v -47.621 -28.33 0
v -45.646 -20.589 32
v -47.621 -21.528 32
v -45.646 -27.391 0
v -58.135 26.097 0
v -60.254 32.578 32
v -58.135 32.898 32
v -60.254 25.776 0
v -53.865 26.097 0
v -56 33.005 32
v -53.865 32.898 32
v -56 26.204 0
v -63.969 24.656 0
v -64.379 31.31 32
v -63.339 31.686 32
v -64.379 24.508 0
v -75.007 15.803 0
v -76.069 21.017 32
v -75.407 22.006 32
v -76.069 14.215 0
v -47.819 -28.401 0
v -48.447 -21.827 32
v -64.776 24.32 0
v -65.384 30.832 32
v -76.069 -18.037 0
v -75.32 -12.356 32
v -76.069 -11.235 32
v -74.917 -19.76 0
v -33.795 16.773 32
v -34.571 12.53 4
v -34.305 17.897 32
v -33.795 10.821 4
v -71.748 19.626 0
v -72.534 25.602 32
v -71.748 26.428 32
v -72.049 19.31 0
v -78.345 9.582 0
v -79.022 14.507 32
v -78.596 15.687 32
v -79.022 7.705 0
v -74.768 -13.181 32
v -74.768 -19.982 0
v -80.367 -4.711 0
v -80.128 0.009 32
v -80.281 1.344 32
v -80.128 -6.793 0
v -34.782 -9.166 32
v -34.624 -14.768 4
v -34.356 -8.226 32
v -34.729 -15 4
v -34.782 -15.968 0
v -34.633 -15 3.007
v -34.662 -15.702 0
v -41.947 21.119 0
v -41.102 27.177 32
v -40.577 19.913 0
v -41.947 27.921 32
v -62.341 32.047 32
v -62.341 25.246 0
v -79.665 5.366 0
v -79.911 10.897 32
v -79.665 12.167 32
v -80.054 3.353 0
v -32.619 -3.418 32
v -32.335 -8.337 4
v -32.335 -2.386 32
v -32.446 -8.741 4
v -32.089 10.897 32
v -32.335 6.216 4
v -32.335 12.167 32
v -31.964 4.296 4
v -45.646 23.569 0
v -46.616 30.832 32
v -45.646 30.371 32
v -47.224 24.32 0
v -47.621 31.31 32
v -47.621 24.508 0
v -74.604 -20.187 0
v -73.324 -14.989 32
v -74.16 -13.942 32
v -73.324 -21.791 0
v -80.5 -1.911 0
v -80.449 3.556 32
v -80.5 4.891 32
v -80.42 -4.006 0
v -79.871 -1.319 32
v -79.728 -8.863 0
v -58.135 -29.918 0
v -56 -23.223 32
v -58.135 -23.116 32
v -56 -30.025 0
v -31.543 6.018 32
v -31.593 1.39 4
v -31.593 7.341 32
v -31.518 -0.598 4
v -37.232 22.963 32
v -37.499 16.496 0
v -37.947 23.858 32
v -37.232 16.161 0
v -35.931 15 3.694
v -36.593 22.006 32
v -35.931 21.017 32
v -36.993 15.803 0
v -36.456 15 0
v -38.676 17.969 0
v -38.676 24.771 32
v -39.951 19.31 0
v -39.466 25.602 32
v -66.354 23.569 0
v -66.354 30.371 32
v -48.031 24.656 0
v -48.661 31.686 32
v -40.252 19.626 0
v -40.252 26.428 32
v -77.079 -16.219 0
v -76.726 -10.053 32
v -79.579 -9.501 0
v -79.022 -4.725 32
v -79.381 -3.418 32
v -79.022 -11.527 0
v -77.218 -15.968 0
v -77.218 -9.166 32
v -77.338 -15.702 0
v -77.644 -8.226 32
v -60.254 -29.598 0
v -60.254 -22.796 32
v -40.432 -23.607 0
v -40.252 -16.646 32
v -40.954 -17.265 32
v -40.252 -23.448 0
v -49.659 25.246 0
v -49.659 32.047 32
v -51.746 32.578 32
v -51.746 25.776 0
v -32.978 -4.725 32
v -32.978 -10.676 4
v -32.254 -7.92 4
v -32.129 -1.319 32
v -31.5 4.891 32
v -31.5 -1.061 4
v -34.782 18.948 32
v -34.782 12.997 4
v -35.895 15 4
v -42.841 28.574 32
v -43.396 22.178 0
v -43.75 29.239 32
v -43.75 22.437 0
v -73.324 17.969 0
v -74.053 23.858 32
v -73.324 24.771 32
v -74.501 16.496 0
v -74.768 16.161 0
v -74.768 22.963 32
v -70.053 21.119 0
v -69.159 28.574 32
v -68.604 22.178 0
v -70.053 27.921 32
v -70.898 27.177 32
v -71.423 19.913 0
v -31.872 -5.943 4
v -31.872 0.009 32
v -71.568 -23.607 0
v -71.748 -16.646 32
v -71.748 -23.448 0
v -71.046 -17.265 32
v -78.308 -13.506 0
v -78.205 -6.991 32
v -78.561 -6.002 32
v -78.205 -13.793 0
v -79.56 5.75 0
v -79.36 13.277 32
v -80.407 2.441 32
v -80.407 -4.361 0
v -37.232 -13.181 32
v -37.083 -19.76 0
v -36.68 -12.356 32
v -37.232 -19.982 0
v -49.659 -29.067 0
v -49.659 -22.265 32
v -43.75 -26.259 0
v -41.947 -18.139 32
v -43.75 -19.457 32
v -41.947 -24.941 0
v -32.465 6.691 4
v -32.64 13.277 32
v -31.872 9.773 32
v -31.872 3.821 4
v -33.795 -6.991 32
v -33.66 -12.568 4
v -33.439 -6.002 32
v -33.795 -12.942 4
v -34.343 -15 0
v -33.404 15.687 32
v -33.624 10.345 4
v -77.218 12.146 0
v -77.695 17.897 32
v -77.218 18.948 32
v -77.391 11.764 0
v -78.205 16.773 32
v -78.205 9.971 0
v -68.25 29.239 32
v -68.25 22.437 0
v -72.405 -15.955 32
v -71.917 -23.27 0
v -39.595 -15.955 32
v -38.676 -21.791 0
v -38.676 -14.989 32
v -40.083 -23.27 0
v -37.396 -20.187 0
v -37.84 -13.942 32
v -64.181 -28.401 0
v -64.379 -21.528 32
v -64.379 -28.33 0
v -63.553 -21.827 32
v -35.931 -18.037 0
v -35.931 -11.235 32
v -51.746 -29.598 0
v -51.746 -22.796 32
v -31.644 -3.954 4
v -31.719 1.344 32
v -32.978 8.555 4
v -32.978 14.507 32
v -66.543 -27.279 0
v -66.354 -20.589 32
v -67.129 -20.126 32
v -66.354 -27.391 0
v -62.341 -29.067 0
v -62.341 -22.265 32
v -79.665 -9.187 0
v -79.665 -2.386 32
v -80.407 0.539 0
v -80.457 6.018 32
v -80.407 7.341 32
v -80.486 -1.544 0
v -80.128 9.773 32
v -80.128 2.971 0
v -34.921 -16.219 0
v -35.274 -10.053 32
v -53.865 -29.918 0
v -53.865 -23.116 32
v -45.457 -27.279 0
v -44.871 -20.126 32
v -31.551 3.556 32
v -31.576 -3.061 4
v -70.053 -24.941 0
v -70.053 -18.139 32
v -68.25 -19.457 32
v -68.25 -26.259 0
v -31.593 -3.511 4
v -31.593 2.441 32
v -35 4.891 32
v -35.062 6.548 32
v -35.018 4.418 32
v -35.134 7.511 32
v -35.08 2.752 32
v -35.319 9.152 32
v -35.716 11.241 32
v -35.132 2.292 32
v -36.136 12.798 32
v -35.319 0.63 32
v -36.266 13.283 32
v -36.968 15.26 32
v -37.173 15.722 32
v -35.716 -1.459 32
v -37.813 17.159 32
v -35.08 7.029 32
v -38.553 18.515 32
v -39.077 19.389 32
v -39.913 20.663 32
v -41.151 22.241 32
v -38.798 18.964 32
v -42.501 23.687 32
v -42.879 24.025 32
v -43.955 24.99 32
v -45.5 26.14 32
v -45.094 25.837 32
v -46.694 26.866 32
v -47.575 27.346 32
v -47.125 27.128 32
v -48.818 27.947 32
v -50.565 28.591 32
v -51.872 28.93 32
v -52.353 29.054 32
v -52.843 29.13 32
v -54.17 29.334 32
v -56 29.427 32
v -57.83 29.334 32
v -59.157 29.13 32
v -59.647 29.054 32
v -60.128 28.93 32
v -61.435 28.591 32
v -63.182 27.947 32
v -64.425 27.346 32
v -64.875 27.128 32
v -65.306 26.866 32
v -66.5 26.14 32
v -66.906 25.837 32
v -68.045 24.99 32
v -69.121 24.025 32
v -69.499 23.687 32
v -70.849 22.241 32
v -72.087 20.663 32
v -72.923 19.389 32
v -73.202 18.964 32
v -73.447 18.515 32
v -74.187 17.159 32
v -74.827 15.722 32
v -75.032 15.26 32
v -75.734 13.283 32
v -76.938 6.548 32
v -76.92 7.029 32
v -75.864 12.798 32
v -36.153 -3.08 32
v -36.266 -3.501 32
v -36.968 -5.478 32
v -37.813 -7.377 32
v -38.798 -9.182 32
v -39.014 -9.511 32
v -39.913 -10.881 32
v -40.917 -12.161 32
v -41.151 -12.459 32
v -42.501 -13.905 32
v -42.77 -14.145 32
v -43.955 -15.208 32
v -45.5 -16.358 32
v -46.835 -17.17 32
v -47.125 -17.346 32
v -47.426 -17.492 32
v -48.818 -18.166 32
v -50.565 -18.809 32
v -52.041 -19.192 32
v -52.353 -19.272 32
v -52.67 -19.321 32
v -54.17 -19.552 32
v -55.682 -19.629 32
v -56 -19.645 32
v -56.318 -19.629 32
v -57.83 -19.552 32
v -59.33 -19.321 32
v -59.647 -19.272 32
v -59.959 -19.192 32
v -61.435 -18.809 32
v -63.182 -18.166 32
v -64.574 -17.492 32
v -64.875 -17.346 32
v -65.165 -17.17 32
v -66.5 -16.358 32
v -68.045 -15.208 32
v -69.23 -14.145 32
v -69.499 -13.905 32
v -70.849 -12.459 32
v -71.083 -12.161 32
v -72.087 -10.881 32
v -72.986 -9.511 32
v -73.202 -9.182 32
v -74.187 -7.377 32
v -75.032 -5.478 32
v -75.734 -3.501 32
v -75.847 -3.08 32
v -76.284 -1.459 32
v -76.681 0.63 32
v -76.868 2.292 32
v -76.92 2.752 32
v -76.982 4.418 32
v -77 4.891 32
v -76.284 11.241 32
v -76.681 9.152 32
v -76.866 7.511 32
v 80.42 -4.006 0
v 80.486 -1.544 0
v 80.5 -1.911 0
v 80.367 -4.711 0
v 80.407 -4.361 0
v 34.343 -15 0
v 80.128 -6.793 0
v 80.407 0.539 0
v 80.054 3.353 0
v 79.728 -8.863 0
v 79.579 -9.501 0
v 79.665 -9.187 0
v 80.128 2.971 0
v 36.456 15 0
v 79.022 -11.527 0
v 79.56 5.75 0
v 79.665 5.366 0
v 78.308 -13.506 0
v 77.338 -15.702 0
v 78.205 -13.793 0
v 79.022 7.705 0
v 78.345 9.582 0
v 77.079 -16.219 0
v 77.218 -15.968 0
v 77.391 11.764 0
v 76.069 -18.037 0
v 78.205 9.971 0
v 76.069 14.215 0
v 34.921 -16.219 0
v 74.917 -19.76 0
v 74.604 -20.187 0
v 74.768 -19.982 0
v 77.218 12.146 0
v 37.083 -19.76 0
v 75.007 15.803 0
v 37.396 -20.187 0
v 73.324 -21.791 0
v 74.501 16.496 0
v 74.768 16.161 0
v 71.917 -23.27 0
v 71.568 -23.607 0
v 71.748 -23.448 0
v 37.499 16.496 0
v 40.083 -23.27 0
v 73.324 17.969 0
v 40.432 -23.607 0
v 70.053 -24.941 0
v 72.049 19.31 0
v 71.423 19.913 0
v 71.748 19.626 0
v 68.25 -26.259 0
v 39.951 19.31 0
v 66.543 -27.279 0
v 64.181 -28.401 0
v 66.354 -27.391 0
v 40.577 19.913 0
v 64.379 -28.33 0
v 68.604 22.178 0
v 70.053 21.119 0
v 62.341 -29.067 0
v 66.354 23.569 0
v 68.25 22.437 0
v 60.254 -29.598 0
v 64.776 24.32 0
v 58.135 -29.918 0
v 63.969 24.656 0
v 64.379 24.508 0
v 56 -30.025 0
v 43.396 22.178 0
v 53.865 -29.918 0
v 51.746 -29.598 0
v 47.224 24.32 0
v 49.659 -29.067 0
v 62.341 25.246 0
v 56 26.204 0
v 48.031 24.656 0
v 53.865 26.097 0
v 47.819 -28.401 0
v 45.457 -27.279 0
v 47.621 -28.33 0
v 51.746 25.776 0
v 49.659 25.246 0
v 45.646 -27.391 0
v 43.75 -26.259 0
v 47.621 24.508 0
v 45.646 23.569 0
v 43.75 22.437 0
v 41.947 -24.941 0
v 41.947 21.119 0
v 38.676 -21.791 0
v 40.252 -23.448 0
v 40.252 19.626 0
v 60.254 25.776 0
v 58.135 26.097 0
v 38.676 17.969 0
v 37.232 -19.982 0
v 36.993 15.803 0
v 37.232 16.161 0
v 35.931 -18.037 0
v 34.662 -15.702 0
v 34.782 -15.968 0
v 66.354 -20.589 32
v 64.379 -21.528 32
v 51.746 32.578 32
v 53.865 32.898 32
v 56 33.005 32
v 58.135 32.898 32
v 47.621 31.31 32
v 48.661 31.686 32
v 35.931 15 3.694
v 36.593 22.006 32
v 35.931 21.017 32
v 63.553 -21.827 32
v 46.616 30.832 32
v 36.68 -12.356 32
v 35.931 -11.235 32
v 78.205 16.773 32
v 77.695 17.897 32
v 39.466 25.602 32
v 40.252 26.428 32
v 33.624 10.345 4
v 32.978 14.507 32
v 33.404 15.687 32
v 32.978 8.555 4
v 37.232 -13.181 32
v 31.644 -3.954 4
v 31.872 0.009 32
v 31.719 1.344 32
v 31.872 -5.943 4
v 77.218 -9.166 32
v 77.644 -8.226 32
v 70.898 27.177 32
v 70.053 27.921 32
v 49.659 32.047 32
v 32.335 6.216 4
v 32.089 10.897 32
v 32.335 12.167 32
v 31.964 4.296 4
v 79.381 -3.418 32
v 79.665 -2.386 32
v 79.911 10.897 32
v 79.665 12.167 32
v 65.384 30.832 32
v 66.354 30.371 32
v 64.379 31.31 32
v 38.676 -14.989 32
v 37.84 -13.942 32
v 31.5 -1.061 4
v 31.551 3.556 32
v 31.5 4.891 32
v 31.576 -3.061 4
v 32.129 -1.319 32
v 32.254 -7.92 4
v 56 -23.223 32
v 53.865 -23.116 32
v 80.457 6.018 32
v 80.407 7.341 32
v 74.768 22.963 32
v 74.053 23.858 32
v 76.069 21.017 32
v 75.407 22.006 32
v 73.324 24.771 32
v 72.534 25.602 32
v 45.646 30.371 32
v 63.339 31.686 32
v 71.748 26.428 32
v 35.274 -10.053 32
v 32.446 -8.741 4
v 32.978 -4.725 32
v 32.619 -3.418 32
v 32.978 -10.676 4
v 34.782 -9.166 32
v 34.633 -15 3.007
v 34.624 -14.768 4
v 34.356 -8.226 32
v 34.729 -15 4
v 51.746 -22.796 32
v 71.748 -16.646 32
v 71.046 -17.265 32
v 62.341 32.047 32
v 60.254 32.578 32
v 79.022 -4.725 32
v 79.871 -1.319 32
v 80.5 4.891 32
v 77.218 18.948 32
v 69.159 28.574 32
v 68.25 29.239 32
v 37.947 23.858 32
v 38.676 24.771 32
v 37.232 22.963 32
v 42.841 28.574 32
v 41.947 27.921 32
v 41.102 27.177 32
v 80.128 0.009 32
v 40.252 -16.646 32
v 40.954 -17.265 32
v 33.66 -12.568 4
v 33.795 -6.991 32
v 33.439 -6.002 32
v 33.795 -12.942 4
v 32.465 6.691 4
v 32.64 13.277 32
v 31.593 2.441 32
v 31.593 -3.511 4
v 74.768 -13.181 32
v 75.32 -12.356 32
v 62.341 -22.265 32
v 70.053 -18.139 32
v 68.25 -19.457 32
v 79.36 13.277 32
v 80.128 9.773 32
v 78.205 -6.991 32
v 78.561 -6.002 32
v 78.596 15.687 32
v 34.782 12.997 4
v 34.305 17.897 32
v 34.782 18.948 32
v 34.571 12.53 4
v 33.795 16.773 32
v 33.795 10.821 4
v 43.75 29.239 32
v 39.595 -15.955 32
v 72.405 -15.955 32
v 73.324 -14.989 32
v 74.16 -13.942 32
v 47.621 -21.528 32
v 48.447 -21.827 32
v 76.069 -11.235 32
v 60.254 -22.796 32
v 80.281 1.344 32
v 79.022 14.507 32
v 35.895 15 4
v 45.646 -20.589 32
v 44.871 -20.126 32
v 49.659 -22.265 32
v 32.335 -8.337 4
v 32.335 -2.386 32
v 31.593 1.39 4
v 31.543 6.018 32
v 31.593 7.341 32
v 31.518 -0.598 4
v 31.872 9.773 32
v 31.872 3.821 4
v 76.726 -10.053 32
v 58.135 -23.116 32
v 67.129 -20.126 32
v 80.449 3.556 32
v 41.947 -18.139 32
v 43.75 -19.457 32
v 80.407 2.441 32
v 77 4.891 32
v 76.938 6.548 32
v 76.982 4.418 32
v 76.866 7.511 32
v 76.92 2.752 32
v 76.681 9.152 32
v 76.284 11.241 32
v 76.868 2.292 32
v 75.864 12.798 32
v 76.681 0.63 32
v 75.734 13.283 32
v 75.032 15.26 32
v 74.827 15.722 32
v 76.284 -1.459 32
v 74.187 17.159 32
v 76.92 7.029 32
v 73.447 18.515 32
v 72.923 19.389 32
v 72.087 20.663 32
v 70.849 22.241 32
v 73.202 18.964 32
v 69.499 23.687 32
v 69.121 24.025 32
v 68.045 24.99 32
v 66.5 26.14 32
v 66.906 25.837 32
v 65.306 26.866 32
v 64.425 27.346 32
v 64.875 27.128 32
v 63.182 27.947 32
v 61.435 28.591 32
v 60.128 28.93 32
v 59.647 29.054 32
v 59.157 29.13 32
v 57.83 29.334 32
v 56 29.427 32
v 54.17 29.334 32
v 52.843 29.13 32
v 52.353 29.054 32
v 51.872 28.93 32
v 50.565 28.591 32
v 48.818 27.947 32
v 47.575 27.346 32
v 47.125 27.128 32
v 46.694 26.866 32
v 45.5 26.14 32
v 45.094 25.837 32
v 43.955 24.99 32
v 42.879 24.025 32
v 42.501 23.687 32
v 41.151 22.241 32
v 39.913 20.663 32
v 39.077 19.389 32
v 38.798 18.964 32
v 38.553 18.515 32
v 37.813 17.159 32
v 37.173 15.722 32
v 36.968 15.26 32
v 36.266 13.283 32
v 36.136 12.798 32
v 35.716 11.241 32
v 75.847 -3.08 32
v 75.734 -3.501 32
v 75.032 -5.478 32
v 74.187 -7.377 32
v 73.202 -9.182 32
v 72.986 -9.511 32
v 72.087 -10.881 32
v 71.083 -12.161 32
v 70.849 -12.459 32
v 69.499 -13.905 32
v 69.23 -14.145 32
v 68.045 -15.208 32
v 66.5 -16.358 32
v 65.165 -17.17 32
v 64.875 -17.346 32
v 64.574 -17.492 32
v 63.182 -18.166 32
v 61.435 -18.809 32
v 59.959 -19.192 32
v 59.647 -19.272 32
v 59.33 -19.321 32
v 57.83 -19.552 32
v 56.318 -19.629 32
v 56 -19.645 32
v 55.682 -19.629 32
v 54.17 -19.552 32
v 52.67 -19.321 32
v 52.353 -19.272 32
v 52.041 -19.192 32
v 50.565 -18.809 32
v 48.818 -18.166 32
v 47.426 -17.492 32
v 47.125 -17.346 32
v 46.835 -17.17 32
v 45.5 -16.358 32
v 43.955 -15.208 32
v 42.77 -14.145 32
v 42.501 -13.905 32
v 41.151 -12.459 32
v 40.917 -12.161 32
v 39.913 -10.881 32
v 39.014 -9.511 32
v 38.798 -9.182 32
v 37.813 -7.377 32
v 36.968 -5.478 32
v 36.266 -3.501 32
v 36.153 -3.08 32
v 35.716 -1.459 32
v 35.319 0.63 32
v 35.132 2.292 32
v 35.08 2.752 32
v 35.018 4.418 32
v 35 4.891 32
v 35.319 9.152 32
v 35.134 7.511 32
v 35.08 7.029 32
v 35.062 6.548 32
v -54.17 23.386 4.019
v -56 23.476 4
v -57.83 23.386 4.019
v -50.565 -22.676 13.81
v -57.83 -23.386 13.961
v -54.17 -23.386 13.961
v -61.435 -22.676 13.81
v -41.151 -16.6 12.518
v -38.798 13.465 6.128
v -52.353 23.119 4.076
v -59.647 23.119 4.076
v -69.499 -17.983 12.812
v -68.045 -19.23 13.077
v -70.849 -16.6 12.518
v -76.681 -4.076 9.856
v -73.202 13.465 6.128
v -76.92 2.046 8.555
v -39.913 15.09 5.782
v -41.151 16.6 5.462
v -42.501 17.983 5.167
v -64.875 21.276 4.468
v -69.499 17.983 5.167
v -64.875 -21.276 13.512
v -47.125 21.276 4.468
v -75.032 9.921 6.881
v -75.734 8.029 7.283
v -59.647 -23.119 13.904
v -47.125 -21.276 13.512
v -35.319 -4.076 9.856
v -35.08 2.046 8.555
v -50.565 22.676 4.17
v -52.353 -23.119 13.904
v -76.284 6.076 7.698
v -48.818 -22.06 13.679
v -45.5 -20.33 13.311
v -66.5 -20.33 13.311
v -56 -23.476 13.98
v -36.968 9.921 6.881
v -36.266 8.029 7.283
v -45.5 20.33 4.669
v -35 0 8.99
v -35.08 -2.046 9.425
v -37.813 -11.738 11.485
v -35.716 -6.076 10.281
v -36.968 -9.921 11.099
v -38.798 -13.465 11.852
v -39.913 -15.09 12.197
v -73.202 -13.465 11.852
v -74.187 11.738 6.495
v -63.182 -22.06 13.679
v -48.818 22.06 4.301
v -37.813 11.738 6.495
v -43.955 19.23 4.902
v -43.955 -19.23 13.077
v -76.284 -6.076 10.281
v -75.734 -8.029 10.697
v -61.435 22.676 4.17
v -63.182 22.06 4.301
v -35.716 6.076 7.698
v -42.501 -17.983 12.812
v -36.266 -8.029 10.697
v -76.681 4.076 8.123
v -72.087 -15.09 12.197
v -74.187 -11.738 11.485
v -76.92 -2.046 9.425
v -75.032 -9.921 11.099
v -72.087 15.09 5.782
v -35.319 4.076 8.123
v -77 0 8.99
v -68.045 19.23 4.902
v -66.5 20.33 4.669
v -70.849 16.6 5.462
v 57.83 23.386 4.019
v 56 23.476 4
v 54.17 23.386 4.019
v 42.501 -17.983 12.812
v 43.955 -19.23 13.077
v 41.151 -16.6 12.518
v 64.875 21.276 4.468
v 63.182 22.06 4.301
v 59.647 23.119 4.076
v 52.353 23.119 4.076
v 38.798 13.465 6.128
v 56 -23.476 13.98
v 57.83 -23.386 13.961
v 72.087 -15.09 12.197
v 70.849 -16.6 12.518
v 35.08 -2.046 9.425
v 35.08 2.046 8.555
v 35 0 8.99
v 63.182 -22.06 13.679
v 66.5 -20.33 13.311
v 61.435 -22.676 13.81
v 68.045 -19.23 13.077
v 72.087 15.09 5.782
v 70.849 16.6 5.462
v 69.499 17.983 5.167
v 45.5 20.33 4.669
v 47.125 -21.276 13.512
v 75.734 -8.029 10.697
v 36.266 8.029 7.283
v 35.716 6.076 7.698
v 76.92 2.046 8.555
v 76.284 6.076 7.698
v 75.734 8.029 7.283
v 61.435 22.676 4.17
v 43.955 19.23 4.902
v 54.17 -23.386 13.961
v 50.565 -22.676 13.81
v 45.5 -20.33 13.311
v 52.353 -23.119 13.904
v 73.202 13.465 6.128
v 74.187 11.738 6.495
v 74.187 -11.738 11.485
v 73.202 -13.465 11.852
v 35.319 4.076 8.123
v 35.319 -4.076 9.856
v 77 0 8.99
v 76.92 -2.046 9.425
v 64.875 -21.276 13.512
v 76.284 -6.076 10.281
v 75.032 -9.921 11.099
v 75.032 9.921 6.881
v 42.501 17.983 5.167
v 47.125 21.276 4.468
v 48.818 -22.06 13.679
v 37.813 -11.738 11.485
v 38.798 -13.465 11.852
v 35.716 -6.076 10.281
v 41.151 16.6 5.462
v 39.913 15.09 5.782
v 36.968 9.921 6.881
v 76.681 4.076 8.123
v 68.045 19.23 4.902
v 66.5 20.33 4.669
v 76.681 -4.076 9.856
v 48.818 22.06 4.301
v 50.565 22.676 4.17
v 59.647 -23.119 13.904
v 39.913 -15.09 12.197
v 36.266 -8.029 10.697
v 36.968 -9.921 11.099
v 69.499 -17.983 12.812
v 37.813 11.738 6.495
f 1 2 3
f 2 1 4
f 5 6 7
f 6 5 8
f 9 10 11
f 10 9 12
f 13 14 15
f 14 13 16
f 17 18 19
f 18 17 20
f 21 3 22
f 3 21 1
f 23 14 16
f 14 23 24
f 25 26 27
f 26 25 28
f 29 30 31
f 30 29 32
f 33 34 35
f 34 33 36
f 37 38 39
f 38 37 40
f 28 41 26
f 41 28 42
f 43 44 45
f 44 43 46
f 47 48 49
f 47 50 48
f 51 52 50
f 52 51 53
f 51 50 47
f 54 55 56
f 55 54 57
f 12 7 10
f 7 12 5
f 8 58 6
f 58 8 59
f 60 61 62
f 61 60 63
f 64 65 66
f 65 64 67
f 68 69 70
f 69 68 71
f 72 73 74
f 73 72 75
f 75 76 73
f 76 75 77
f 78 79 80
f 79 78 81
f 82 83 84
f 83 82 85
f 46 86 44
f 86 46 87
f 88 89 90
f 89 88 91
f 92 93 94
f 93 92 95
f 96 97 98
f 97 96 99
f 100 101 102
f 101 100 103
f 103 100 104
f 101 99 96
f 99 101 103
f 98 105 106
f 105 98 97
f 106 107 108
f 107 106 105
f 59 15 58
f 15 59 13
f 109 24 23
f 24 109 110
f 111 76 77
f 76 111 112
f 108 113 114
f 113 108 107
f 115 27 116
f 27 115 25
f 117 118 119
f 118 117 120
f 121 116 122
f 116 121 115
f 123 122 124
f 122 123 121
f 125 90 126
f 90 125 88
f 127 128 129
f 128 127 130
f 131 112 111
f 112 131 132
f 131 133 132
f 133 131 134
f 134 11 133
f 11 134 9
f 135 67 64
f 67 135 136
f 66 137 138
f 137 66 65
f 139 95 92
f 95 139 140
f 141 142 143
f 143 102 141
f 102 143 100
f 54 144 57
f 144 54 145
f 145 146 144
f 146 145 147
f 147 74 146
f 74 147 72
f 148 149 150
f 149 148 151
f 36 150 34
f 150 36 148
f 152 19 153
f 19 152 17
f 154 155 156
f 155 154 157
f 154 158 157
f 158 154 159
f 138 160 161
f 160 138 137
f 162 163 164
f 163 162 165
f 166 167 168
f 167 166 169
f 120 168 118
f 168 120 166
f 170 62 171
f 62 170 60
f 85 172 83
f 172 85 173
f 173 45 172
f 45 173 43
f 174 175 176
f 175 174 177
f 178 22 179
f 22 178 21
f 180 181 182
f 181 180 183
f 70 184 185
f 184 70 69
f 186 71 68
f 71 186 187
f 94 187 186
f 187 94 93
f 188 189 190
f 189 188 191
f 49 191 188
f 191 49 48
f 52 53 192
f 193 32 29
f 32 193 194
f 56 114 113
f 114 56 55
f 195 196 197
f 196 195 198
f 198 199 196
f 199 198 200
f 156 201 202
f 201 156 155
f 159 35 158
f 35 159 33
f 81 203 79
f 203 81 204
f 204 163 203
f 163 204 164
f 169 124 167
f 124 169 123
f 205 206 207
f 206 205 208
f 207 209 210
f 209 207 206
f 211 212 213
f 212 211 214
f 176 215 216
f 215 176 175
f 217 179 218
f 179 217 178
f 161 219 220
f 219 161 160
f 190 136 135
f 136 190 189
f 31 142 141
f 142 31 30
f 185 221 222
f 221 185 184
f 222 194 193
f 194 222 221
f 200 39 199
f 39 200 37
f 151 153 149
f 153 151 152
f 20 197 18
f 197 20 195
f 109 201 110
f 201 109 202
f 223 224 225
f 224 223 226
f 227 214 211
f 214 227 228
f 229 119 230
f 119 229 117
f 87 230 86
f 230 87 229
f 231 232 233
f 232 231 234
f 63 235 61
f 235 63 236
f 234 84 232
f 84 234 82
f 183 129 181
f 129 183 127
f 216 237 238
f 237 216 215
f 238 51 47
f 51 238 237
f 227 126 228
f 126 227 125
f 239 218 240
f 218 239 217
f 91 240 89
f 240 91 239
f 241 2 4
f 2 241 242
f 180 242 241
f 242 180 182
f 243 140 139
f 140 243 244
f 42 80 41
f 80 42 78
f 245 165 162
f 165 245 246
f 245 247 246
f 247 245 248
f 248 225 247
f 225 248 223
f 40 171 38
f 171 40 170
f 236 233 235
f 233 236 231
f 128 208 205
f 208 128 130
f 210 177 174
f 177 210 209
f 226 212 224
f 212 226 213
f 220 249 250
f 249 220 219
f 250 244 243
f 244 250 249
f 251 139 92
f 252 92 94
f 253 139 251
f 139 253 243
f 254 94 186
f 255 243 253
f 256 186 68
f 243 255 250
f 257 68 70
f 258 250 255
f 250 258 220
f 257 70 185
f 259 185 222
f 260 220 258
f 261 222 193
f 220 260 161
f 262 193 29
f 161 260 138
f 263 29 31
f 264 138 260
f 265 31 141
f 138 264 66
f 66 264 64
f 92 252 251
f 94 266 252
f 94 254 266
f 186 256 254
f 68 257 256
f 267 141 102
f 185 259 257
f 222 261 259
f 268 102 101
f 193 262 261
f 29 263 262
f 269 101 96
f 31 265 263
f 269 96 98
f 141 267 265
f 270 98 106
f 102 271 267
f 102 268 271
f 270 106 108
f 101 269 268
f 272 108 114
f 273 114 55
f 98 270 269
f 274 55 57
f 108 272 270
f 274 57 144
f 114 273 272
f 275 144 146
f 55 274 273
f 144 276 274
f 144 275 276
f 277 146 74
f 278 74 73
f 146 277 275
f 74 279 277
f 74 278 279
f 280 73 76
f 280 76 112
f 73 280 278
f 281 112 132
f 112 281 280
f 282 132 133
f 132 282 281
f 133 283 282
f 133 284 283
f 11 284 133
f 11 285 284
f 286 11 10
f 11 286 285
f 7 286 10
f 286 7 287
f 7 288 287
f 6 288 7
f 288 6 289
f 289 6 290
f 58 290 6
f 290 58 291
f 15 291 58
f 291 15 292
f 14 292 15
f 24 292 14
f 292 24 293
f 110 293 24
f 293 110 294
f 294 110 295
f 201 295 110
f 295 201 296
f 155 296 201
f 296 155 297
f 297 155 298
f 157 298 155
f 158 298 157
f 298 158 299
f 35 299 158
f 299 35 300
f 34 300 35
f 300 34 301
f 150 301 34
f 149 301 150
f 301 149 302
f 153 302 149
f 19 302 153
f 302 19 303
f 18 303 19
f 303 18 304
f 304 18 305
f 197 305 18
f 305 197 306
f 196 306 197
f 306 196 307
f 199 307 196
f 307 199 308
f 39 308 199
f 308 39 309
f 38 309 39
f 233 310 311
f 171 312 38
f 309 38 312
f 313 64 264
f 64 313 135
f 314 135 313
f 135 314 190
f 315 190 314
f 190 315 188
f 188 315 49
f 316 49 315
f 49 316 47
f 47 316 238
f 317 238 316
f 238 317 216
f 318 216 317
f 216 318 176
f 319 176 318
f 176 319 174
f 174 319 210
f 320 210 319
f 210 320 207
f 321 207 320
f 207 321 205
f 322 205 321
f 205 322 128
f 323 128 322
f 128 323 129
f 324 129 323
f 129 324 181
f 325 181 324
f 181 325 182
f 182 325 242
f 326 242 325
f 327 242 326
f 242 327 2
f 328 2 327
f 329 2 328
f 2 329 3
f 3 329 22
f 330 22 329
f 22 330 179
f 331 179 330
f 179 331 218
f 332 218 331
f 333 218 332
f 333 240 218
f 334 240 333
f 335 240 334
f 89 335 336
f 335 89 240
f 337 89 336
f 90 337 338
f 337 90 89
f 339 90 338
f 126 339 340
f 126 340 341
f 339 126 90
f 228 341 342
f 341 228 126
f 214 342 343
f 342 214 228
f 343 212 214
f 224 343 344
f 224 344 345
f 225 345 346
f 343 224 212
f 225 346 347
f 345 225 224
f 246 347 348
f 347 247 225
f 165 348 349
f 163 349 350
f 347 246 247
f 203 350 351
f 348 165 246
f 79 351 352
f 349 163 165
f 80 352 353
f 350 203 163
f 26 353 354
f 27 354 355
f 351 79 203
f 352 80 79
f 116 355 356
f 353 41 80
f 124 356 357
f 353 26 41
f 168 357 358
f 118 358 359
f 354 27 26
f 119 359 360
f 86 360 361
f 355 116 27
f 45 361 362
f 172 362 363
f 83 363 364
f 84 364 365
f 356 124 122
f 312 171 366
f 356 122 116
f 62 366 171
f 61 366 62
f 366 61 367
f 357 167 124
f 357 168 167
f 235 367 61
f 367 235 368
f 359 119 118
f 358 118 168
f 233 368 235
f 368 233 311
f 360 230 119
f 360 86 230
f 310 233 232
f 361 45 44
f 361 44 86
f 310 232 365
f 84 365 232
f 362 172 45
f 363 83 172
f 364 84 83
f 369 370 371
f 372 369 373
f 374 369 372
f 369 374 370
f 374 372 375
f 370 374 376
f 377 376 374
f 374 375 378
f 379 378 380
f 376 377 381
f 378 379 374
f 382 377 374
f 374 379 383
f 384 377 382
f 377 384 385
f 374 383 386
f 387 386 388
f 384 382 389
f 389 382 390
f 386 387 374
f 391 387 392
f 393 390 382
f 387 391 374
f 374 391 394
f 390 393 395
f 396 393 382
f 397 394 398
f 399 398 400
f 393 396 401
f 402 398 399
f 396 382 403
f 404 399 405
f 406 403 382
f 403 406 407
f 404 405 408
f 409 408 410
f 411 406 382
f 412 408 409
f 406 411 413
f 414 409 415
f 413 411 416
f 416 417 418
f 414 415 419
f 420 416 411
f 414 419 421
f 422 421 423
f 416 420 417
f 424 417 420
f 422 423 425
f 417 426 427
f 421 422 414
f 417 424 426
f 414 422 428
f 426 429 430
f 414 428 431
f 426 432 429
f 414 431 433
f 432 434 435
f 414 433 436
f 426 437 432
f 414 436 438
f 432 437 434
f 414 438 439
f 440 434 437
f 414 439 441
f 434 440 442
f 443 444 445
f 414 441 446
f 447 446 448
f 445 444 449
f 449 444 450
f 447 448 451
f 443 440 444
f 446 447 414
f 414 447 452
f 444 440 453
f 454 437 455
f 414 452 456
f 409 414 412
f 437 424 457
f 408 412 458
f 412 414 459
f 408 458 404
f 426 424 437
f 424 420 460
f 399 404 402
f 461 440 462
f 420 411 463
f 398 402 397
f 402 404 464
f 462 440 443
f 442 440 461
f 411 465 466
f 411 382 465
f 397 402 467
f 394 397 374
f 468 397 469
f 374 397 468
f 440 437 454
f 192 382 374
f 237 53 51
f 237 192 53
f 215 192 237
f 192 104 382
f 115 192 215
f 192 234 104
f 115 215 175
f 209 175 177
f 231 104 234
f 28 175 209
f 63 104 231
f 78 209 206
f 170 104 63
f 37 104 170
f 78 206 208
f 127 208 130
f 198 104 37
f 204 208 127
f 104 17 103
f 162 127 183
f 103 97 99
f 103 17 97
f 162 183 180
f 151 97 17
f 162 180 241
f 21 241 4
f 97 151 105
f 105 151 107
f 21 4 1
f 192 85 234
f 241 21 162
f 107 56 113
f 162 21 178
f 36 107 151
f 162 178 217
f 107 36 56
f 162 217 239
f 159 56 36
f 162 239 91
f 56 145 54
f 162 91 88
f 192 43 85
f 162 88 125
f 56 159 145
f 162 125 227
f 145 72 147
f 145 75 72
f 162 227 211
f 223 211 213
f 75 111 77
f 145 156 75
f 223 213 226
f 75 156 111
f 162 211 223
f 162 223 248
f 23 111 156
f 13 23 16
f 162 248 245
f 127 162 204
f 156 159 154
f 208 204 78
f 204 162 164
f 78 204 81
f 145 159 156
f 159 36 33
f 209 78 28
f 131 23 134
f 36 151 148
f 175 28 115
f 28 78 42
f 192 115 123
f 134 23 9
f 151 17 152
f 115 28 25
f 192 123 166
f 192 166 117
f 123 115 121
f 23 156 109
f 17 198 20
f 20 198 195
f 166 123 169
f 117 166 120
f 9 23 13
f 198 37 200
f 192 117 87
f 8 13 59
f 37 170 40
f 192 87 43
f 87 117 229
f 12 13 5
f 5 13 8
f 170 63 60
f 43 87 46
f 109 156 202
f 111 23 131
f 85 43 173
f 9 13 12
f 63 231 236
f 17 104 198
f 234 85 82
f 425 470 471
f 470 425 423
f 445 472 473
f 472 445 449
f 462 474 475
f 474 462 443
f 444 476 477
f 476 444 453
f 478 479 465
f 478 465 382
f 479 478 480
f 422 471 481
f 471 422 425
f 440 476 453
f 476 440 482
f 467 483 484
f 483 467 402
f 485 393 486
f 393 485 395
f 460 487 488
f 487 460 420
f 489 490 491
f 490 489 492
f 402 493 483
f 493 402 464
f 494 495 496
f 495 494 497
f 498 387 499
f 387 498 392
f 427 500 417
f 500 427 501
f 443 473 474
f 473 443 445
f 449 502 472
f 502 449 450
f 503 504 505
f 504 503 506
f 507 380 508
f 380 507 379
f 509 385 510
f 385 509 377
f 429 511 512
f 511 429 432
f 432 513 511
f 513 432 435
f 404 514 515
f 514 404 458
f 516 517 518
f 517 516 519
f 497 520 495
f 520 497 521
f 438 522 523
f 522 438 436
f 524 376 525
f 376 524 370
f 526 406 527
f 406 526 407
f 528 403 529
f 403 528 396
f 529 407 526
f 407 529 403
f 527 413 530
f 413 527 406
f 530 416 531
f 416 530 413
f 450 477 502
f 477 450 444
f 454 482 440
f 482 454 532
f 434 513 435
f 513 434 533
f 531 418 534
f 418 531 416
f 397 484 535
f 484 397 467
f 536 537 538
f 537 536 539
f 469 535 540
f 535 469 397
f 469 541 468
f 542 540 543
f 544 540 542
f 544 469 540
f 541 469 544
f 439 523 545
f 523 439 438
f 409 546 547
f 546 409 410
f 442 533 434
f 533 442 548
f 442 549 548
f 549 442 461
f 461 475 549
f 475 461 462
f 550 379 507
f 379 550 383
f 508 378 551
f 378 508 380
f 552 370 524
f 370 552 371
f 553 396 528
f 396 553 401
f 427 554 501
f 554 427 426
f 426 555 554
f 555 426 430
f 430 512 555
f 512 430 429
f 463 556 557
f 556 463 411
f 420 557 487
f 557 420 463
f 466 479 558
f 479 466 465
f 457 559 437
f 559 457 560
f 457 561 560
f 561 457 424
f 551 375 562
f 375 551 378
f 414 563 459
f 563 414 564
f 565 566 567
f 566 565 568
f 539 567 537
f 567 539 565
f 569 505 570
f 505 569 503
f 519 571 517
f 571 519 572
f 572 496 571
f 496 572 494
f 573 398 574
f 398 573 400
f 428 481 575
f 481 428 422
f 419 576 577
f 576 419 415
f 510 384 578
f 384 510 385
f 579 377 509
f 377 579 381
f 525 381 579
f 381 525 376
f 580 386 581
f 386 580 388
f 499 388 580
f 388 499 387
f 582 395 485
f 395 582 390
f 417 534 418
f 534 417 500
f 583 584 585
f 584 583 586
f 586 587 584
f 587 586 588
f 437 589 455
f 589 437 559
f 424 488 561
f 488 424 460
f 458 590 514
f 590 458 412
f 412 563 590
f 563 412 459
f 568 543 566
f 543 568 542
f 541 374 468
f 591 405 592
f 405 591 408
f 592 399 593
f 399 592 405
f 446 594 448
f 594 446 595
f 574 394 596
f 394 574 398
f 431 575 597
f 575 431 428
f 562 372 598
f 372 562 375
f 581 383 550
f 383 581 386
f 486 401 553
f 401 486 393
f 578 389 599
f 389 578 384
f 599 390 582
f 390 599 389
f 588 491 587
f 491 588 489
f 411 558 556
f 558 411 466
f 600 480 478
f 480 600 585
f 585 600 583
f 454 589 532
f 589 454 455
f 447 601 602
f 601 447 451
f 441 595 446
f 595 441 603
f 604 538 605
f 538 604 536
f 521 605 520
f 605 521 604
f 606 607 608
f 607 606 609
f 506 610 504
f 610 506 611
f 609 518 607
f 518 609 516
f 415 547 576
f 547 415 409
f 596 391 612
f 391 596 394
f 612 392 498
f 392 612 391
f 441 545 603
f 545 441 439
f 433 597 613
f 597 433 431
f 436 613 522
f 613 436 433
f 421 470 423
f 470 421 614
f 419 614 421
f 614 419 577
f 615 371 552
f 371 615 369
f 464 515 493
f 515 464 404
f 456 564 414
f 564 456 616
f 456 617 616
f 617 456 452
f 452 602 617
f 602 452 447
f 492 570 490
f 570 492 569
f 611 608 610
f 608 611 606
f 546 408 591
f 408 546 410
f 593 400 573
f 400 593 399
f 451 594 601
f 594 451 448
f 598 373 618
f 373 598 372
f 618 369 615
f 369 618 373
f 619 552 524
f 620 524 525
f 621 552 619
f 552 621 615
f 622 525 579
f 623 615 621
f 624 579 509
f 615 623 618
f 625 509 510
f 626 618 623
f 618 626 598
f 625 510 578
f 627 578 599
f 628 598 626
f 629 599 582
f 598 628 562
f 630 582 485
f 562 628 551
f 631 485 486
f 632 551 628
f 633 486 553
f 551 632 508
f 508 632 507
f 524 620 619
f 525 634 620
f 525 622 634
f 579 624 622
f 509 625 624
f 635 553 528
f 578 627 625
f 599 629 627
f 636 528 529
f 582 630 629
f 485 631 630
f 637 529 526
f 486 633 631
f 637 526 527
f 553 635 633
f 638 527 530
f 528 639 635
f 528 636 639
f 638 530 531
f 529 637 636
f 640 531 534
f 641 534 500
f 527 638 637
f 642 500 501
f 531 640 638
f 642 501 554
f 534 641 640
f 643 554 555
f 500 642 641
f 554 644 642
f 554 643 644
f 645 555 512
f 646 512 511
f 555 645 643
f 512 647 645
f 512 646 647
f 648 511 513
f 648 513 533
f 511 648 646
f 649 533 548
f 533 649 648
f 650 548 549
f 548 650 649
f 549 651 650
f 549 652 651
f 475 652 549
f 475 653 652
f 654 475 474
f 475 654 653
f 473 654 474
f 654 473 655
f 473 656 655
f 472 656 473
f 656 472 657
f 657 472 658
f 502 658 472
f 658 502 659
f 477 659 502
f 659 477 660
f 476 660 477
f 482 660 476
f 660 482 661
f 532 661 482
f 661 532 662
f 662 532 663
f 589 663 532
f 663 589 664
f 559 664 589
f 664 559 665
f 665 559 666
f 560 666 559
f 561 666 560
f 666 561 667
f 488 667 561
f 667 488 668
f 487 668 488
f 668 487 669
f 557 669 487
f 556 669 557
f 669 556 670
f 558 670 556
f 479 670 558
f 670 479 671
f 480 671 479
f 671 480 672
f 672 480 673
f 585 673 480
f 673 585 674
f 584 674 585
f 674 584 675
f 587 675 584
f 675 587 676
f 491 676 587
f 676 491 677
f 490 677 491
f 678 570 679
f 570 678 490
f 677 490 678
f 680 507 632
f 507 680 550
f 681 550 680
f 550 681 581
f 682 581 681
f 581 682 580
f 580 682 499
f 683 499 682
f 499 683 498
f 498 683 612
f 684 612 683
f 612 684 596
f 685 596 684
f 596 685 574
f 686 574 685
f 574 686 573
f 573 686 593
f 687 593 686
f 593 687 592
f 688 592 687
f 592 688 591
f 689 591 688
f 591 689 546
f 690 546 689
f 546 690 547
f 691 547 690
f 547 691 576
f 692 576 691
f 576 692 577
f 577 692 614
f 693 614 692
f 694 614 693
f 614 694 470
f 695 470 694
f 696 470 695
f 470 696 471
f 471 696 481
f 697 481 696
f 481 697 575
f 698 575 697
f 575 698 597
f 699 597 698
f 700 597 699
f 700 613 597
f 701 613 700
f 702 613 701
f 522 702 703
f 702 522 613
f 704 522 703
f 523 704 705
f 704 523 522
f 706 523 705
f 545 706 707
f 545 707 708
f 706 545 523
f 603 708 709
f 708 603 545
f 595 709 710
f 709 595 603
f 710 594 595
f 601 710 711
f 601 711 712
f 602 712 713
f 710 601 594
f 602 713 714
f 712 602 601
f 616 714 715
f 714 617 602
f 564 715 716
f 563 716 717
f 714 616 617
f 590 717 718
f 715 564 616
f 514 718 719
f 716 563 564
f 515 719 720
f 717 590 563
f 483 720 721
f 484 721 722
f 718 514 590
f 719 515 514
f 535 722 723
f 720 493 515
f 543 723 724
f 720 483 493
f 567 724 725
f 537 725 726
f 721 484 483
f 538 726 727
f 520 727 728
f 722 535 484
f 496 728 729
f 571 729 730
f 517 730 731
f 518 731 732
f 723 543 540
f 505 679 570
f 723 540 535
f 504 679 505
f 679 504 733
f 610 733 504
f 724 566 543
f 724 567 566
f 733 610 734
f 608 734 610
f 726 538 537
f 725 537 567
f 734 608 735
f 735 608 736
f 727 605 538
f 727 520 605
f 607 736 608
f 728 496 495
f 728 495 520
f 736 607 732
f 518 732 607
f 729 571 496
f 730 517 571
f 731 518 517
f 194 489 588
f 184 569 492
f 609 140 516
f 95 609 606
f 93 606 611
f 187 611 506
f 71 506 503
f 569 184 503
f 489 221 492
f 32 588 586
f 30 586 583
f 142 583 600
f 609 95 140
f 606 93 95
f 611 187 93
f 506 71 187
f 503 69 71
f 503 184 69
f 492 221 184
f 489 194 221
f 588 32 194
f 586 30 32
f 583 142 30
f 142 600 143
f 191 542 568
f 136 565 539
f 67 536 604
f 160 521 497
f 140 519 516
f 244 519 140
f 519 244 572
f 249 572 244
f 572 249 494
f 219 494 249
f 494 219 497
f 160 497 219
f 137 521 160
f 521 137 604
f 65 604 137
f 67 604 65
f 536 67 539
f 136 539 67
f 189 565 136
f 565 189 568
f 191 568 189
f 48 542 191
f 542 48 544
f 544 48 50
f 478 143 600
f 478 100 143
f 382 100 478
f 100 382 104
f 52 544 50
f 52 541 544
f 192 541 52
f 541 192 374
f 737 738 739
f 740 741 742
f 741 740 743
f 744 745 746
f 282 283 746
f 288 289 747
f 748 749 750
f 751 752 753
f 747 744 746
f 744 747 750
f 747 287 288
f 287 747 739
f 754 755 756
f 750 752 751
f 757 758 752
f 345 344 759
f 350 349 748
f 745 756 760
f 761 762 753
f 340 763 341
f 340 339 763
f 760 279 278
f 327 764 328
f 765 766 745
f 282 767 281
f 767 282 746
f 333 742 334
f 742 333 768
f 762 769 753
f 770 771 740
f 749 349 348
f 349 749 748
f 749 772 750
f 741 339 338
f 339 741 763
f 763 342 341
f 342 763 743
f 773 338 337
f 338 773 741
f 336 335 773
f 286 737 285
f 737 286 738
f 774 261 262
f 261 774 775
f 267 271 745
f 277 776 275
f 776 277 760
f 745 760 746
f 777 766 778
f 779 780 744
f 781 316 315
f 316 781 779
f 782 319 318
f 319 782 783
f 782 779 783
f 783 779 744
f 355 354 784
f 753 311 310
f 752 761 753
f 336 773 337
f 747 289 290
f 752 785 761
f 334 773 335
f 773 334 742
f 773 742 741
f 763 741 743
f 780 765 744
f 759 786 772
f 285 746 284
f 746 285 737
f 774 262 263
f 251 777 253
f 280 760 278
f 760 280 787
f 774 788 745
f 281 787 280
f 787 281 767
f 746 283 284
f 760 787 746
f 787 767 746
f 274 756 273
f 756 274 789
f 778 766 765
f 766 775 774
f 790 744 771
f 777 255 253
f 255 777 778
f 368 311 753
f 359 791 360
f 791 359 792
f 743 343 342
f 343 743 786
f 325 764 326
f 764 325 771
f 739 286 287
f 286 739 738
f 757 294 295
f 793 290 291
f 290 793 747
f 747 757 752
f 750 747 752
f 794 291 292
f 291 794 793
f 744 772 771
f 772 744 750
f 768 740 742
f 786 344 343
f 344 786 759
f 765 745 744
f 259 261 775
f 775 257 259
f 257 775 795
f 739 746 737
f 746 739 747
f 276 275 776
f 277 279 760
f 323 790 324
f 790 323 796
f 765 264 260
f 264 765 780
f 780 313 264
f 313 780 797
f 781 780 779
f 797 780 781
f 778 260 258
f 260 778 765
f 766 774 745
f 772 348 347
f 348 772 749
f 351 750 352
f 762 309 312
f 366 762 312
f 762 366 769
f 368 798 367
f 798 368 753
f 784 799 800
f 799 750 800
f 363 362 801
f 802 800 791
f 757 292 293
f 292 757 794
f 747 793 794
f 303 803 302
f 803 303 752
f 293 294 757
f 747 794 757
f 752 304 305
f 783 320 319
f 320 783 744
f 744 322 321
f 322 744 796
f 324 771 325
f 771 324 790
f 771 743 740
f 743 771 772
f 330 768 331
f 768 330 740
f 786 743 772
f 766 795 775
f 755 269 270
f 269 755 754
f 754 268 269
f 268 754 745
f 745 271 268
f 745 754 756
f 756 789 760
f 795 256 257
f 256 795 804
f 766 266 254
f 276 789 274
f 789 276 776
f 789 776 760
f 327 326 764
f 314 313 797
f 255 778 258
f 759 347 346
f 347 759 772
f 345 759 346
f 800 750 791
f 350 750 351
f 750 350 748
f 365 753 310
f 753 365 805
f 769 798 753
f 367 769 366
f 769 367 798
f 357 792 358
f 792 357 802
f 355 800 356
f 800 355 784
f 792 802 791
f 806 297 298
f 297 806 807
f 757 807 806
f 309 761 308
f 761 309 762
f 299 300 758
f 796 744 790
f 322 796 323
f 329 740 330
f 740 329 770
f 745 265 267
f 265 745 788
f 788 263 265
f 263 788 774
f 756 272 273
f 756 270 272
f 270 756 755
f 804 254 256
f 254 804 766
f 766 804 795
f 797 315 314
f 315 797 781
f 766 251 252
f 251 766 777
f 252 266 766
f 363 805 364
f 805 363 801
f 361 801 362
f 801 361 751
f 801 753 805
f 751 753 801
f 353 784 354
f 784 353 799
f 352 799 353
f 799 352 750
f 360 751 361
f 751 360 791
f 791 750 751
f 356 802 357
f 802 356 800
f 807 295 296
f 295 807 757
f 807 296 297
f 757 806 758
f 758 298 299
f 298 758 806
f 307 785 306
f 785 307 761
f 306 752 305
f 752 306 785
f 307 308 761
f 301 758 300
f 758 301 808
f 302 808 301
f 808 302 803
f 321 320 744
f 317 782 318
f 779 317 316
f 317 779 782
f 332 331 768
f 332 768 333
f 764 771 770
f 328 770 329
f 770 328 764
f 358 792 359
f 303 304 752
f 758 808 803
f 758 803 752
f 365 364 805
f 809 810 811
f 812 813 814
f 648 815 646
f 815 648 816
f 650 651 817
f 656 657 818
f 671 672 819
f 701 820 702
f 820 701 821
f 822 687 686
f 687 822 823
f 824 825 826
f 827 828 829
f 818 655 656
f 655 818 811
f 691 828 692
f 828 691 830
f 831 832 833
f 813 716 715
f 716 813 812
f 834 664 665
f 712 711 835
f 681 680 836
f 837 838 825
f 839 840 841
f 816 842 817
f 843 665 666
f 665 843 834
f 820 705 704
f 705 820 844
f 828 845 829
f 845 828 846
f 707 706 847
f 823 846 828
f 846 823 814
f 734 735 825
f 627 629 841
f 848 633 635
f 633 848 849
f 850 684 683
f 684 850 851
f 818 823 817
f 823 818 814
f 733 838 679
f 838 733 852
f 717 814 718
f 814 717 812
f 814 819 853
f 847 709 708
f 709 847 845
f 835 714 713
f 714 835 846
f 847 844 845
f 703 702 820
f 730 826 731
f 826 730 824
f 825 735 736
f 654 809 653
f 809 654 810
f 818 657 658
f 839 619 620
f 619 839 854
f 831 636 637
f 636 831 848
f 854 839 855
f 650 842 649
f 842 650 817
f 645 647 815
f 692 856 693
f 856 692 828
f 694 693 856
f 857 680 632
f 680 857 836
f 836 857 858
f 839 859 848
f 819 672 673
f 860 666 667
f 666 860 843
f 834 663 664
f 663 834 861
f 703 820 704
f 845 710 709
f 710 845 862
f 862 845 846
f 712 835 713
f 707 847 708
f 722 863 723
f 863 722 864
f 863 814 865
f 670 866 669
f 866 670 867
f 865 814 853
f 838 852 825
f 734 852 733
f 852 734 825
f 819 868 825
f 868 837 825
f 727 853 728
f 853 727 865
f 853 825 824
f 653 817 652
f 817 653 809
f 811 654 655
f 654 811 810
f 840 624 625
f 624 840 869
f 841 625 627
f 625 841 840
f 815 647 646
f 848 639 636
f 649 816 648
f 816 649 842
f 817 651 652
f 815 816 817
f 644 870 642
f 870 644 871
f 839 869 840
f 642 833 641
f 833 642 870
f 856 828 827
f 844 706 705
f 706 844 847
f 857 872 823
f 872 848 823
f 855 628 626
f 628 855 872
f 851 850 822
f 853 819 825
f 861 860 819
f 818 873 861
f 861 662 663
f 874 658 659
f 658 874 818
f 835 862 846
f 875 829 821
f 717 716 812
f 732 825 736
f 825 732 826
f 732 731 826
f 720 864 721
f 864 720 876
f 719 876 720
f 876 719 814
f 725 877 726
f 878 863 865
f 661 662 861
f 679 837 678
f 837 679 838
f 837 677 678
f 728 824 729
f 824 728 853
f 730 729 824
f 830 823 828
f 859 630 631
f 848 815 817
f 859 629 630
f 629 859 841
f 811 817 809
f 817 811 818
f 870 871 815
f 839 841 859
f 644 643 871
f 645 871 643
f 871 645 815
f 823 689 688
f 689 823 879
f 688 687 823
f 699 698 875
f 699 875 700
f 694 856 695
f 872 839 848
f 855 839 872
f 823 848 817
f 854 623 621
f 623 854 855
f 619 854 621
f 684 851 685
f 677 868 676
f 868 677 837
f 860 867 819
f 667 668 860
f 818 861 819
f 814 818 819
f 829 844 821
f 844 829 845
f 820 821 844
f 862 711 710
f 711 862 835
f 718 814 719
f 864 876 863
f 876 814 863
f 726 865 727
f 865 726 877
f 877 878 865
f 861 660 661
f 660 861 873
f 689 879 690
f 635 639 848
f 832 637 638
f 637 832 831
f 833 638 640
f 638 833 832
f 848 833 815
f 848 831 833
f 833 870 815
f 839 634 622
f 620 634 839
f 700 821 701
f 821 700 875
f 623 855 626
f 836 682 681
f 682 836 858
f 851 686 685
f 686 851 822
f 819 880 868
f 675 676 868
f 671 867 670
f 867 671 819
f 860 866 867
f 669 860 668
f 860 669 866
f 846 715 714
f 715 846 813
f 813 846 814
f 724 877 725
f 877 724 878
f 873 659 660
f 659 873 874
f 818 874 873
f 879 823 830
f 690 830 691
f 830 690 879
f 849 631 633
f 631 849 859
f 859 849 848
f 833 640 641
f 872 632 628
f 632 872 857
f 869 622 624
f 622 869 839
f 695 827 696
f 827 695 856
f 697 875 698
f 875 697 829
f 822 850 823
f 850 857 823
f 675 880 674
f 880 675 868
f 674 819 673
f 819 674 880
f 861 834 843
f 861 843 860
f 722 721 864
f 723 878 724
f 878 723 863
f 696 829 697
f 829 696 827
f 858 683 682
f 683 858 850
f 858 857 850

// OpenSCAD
// Soporte para mando PS5 (DualSense) - paramétrico
// El mando se apoya de pie sobre las dos empuñaduras, inclinado hacia atrás.
// Se imprime tal cual, apoyado en la cama, sin soportes.
// Todas las medidas en mm. MIDE tu mando con un calibre y ajusta los valores.

/* [Mando] */
grip_spacing = 112;  // distancia entre centros de las dos empuñaduras
grip_w       = 40;   // ancho del extremo de la empuñadura (eje X)
grip_d       = 46;   // fondo del extremo de la empuñadura (eje Y)

/* [Soporte] */
clearance    = 1.0;  // holgura alrededor de la empuñadura
wall         = 3.5;  // grosor de pared
base_t       = 4;    // grosor de la base bajo las cavidades
pocket_depth = 28;   // profundidad de cada cavidad
tilt         = 12;   // inclinación hacia atrás (grados)
bridge_d     = 30;   // fondo de la pieza que une las dos cavidades

$fn = 72;

in_w = grip_w + 2*clearance;
in_d = grip_d + 2*clearance;
out_w = in_w + 2*wall;
out_d = in_d + 2*wall;
H  = base_t + pocket_depth;
z0 = base_t + (in_d/2)*sin(tilt);   // el punto más bajo del hueco queda a base_t

module oval(w, d, h) {
    linear_extrude(height = h) scale([w/2, d/2]) circle(r = 1);
}

module tilted(w, d, len, start = 0) {
    translate([0, 0, z0]) rotate([-tilt, 0, 0]) translate([0, 0, start]) oval(w, d, len);
}

module cup_body() {
    intersection() {
        tilted(out_w, out_d, pocket_depth*2 + 50, -25);
        translate([-100, -100, 0]) cube([200, 200, H]);
    }
}

module cup_hole() {
    tilted(in_w, in_d, pocket_depth*2 + 50);   // el suelo del hueco arranca en z0
}

difference() {
    union() {
        for (s = [-1, 1]) translate([s*grip_spacing/2, 0, 0]) cup_body();
        // pieza que une las dos cavidades
        translate([-grip_spacing/2, -bridge_d/2, 0]) cube([grip_spacing, bridge_d, base_t]);
    }
    for (s = [-1, 1]) translate([s*grip_spacing/2, 0, 0]) cup_hole();
}
